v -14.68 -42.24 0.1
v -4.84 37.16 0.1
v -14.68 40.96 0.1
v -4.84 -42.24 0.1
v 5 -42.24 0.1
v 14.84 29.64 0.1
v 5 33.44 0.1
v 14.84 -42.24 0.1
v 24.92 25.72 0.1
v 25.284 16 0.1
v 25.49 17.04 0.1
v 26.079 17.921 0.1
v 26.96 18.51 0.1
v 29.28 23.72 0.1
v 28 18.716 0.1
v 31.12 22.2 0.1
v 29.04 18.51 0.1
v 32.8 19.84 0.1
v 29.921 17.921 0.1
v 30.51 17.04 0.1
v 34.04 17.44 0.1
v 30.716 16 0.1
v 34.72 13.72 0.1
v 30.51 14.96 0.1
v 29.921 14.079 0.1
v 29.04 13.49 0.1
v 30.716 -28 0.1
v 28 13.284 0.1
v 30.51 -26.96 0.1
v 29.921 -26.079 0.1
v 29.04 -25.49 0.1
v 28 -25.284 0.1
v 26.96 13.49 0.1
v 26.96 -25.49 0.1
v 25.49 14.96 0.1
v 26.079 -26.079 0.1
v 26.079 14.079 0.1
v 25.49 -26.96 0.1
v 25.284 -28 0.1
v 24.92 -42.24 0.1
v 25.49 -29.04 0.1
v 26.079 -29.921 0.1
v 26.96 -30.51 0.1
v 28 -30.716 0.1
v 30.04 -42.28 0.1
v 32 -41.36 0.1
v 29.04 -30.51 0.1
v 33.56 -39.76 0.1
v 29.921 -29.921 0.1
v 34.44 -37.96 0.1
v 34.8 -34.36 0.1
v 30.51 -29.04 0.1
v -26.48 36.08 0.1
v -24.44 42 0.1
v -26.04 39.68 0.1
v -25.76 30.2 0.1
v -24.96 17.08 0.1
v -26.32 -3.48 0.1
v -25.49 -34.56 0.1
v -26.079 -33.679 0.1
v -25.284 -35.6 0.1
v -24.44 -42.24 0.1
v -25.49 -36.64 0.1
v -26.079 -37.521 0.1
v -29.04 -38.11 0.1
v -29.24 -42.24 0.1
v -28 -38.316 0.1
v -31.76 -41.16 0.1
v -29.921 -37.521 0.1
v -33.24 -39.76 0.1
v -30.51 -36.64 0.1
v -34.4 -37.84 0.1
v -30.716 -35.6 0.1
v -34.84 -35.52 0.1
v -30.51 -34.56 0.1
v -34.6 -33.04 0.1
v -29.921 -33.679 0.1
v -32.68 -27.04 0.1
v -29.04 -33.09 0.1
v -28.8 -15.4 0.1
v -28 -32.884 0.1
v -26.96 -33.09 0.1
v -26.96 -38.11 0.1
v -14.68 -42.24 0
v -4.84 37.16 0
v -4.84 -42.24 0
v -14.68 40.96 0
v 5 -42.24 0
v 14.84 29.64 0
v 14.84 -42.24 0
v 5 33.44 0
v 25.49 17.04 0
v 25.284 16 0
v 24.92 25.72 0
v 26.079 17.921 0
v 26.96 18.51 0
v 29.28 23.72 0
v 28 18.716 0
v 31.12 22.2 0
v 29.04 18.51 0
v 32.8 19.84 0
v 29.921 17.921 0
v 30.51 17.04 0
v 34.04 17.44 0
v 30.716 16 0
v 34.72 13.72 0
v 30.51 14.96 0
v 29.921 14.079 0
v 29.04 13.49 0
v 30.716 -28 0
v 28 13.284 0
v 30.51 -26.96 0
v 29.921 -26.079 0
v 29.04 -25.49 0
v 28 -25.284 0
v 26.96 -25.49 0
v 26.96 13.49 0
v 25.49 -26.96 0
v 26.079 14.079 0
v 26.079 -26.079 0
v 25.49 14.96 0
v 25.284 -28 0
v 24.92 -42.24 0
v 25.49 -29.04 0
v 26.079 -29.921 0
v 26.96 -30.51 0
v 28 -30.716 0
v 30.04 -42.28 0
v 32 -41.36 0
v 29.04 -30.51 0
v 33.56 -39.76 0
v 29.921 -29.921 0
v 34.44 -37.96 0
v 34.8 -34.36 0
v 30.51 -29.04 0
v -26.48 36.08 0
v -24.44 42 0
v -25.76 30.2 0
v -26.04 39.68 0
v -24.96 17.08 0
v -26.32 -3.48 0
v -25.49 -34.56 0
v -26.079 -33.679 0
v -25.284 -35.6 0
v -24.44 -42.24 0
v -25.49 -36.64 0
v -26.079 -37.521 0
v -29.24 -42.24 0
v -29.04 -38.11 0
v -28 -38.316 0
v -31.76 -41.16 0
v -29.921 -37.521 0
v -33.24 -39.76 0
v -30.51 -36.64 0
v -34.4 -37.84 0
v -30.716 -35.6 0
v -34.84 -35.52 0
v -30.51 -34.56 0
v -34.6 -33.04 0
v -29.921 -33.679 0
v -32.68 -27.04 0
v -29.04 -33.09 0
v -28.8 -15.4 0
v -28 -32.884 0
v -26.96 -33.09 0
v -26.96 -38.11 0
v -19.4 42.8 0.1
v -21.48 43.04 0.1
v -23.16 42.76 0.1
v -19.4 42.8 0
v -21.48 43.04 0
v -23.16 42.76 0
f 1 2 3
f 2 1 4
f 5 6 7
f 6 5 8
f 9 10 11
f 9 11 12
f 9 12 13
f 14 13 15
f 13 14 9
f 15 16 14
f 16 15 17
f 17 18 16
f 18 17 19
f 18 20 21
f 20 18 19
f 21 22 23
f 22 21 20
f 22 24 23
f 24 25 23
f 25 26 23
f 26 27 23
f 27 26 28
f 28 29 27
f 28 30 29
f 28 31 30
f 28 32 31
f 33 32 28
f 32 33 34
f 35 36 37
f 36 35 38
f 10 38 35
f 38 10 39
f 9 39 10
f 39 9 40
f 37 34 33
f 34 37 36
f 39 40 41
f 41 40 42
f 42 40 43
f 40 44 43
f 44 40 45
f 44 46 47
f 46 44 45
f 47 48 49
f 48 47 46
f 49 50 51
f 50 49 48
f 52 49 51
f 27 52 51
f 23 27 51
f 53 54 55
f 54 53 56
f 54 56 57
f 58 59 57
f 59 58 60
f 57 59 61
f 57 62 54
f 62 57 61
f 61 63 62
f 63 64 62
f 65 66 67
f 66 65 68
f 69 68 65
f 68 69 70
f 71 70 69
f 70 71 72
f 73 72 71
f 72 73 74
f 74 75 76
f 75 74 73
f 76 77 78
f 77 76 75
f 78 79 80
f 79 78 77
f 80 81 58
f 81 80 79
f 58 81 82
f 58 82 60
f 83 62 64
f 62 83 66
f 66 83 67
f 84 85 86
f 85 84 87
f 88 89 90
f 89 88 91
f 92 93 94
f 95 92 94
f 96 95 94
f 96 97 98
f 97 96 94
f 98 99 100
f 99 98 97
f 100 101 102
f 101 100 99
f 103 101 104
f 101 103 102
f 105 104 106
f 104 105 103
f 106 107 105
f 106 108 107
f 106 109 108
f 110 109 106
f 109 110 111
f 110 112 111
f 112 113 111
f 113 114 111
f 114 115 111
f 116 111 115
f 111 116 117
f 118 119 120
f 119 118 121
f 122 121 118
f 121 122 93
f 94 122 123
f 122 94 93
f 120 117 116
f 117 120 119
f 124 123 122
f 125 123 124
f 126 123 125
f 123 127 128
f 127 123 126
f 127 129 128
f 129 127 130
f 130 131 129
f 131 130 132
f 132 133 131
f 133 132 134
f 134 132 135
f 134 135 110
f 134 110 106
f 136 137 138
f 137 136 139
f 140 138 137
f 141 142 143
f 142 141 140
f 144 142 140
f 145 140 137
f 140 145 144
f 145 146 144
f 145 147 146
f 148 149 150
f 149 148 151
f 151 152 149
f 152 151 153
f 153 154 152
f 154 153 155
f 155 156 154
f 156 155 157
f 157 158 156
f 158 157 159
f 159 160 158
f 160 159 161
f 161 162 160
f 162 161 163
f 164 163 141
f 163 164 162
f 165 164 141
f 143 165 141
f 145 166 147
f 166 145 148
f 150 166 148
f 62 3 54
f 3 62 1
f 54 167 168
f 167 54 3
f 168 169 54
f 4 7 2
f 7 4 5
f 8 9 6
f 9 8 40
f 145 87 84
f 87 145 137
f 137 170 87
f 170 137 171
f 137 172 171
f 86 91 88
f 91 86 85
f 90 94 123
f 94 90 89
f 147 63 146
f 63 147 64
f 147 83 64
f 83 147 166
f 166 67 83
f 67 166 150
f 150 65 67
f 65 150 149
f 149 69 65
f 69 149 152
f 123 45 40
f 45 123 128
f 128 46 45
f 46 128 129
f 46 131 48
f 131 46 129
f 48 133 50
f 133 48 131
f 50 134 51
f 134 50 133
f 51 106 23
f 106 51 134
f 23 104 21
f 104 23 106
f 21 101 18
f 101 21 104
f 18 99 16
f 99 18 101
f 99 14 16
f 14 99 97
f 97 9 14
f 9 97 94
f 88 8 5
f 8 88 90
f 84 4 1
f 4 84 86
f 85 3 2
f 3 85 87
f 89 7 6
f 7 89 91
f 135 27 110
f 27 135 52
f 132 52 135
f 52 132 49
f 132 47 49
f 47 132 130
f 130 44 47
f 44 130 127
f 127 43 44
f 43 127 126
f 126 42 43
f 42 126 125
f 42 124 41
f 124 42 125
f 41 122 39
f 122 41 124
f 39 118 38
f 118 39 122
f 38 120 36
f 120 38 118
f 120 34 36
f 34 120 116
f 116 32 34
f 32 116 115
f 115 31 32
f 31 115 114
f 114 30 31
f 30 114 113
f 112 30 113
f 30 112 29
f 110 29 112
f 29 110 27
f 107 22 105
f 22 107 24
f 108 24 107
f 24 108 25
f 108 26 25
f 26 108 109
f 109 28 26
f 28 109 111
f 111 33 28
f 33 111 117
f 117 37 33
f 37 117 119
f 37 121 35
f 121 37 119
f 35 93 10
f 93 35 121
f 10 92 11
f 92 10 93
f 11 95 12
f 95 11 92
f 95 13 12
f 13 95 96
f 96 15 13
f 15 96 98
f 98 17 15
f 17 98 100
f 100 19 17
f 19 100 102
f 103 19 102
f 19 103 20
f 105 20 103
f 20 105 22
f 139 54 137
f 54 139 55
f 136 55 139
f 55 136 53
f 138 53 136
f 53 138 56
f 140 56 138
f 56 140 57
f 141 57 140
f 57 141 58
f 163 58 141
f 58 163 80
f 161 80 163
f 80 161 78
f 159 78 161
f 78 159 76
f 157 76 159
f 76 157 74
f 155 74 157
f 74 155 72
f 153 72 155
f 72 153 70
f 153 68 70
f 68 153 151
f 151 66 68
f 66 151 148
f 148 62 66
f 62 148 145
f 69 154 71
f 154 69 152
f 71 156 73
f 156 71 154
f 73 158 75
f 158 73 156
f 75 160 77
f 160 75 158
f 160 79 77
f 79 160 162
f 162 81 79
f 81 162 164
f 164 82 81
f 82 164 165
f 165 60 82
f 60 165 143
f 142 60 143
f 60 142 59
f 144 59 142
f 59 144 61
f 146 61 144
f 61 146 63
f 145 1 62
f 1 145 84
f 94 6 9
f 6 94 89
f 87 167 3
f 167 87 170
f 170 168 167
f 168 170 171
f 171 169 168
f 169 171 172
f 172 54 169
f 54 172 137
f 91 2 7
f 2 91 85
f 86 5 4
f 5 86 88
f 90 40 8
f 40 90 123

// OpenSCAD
// file: s/u768s04.scad
use <../../lib.scad>
function ldraw_lib__s__u768s04() = [
// 0 ~Sail 11 x  9 Trapezoidal Edge Stripe  2
// 0 Name: s\u768s04.dat
// 0 Author: Philippe Hurbain [Philo]
// 0 !LDRAW_ORG Subpart UPDATE 2024-01
// 0 !LICENSE Licensed under CC BY 4.0 : see CAreadme.txt
// 
// 0 BFC CERTIFY CCW
  [0,"BFC","CERTIFY"],
  [0,"BFC","CCW"],
// 
// 0 !HISTORY 2024-01-29 [OrionP] Official Update 2024-01
// 
// 
// 4 16 -61.1 0 -105.6 -36.7 0 -105.6 -36.7 -0.25 -105.6 -61.1 -0.25 -105.6
  [4,16,-61.1,0,-105.6,-36.7,0,-105.6,-36.7,-0.25,-105.6,-61.1,-0.25,-105.6],
// 4 16 62.3 0 64.3 37.1 0 74.1 37.1 -0.25 74.1 62.3 -0.25 64.3
  [4,16,62.3,0,64.3,37.1,0,74.1,37.1,-0.25,74.1,62.3,-0.25,64.3],
// 4 16 -36.7 0 102.4 -48.5 0 107 -48.5 -0.25 107 -36.7 -0.25 102.4
  [4,16,-36.7,0,102.4,-48.5,0,107,-48.5,-0.25,107,-36.7,-0.25,102.4],
// 4 16 -48.5 0 107 -53.7 0 107.6 -53.7 -0.25 107.6 -48.5 -0.25 107
  [4,16,-48.5,0,107,-53.7,0,107.6,-53.7,-0.25,107.6,-48.5,-0.25,107],
// 4 16 -53.7 0 107.6 -57.9 0 106.9 -57.9 -0.25 106.9 -53.7 -0.25 107.6
  [4,16,-53.7,0,107.6,-57.9,0,106.9,-57.9,-0.25,106.9,-53.7,-0.25,107.6],
// 4 16 -57.9 0 106.9 -61.1 0 105 -61.1 -0.25 105 -57.9 -0.25 106.9
  [4,16,-57.9,0,106.9,-61.1,0,105,-61.1,-0.25,105,-57.9,-0.25,106.9],
// 4 16 12.5 0 83.6 -12.1 0 92.9 -12.1 -0.25 92.9 12.5 -0.25 83.6
  [4,16,12.5,0,83.6,-12.1,0,92.9,-12.1,-0.25,92.9,12.5,-0.25,83.6],
// 4 16 -12.1 0 -105.6 12.5 0 -105.6 12.5 -0.25 -105.6 -12.1 -0.25 -105.6
  [4,16,-12.1,0,-105.6,12.5,0,-105.6,12.5,-0.25,-105.6,-12.1,-0.25,-105.6],
// 4 16 37.1 0 -105.6 62.3 0 -105.6 62.3 -0.25 -105.6 37.1 -0.25 -105.6
  [4,16,37.1,0,-105.6,62.3,0,-105.6,62.3,-0.25,-105.6,37.1,-0.25,-105.6],
// 5 24 -57.9 0 106.9 -57.9 -0.25 106.9 -61.1 0 105 -53.7 0 107.6
  [5,24,-57.9,0,106.9,-57.9,-0.25,106.9,-61.1,0,105,-53.7,0,107.6],
// 5 24 -48.5 0 107 -48.5 -0.25 107 -53.7 0 107.6 -36.7 0 102.4
  [5,24,-48.5,0,107,-48.5,-0.25,107,-53.7,0,107.6,-36.7,0,102.4],
// 5 24 -53.7 0 107.6 -53.7 -0.25 107.6 -57.9 0 106.9 -48.5 0 107
  [5,24,-53.7,0,107.6,-53.7,-0.25,107.6,-57.9,0,106.9,-48.5,0,107],
];
module ldraw_lib__s__u768s04(step=0, col=false, unit=2/5, alt=false, line=0.2, solid=!$preview)
    makepoly(ldraw_lib__s__u768s04(), step=step, col=col, unit=unit, alt=alt, line=line, solid=solid);
ldraw_lib__s__u768s04(line=0.2);
// file: s/u768s02.scad
use <../../lib.scad>
function ldraw_lib__s__u768s02() = [
// 0 ~Sail 11 x  9 Trapezoidal Surface Stripe  2
// 0 Name: s\u768s02.dat
// 0 Author: Philippe Hurbain [Philo]
// 0 !LDRAW_ORG Subpart UPDATE 2024-01
// 0 !LICENSE Licensed under CC BY 4.0 : see CAreadme.txt
// 
// 0 BFC CERTIFY CCW
  [0,"BFC","CERTIFY"],
  [0,"BFC","CCW"],
// 
// 0 !HISTORY 2024-01-29 [OrionP] Official Update 2024-01
// 
// 
// 4 16 -61.1 0 -105.6 -36.7 0 -105.6 -36.7 0 102.4 -61.1 0 105
  [4,16,-61.1,0,-105.6,-36.7,0,-105.6,-36.7,0,102.4,-61.1,0,105],
// 4 16 -61.1 0 105 -36.7 0 102.4 -48.5 0 107 -53.7 0 107.6
  [4,16,-61.1,0,105,-36.7,0,102.4,-48.5,0,107,-53.7,0,107.6],
// 3 16 -53.7 0 107.6 -57.9 0 106.9 -61.1 0 105
  [3,16,-53.7,0,107.6,-57.9,0,106.9,-61.1,0,105],
// 4 16 12.5 0 83.6 -12.1 0 92.9 -12.1 0 -105.6 12.5 0 -105.6
  [4,16,12.5,0,83.6,-12.1,0,92.9,-12.1,0,-105.6,12.5,0,-105.6],
// 4 16 37.1 0 -105.6 62.3 0 -105.6 62.3 0 64.3 37.1 0 74.1
  [4,16,37.1,0,-105.6,62.3,0,-105.6,62.3,0,64.3,37.1,0,74.1],
// 2 24 37.1 0 -105.6 62.3 0 -105.6
  [2,24,37.1,0,-105.6,62.3,0,-105.6],
// 2 24 -61.1 0 -105.6 -36.7 0 -105.6
  [2,24,-61.1,0,-105.6,-36.7,0,-105.6],
// 2 24 62.3 0 64.3 37.1 0 74.1
  [2,24,62.3,0,64.3,37.1,0,74.1],
// 2 24 -53.7 0 107.6 -57.9 0 106.9
  [2,24,-53.7,0,107.6,-57.9,0,106.9],
// 2 24 -57.9 0 106.9 -61.1 0 105
  [2,24,-57.9,0,106.9,-61.1,0,105],
// 2 24 12.5 0 83.6 -12.1 0 92.9
  [2,24,12.5,0,83.6,-12.1,0,92.9],
// 2 24 -48.5 0 107 -53.7 0 107.6
  [2,24,-48.5,0,107,-53.7,0,107.6],
// 2 24 -36.7 0 102.4 -48.5 0 107
  [2,24,-36.7,0,102.4,-48.5,0,107],
// 2 24 -12.1 0 -105.6 12.5 0 -105.6
  [2,24,-12.1,0,-105.6,12.5,0,-105.6],
];
module ldraw_lib__s__u768s02(step=0, col=false, unit=2/5, alt=false, line=0.2, solid=!$preview)
    makepoly(ldraw_lib__s__u768s02(), step=step, col=col, unit=unit, alt=alt, line=line, solid=solid);
ldraw_lib__s__u768s02(line=0.2);
// main file
use <../lib.scad>
use <s/u768s01.scad>
use <s/u768s02.scad>
use <s/u768s03.scad>
use <s/u768s04.scad>
function ldraw_lib__u768p01() = [
// 0 Sail 11 x  9 Trapezoidal with Stripes on White Background Pattern
// 0 Name: u768p01.dat
// 0 Author: Philippe Hurbain [Philo]
// 0 !LDRAW_ORG Part UPDATE 2024-01
// 0 !LICENSE Licensed under CC BY 4.0 : see CAreadme.txt
// 
// 0 BFC CERTIFY CCW
  [0,"BFC","CERTIFY"],
  [0,"BFC","CCW"],
// 
// 0 !CATEGORY Sheet Fabric
// 0 !KEYWORDS BrickLink sailbb24, Enchanted Island, Imperial Trading Post
// 0 !KEYWORDS King Kahuka's Throne, Lagoon Lock-Up, Rebrickable 70966pr0001
// 0 !KEYWORDS Rock Island Refuge, set 6262, set 6267, set 6273, set 6277, set 6278
// 0 !KEYWORDS set 6292
// 
// 0 !HISTORY 2024-01-29 [OrionP] Official Update 2024-01
// 
// 
// 1 15 0 -0.25 0 1 0 0 0 1 0 0 0 1 s\u768s01.dat
  [1,15,0,-0.25,0,1,0,0,0,1,0,0,0,1, ldraw_lib__s__u768s01()],
// 1 15 0 0 0 1 0 0 0 -1 0 0 0 1 s\u768s01.dat
  [1,15,0,0,0,1,0,0,0,-1,0,0,0,1, ldraw_lib__s__u768s01()],
// 1 16 0 -0.25 0 1 0 0 0 1 0 0 0 1 s\u768s02.dat
  [1,16,0,-0.25,0,1,0,0,0,1,0,0,0,1, ldraw_lib__s__u768s02()],
// 1 16 0 0 0 1 0 0 0 -1 0 0 0 1 s\u768s02.dat
  [1,16,0,0,0,1,0,0,0,-1,0,0,0,1, ldraw_lib__s__u768s02()],
// 1 15 0 0 0 1 0 0 0 1 0 0 0 1 s\u768s03.dat
  [1,15,0,0,0,1,0,0,0,1,0,0,0,1, ldraw_lib__s__u768s03()],
// 1 16 0 0 0 1 0 0 0 1 0 0 0 1 s\u768s04.dat
  [1,16,0,0,0,1,0,0,0,1,0,0,0,1, ldraw_lib__s__u768s04()],
];
module ldraw_lib__u768p01(step=0, col=false, unit=2/5, alt=false, line=0.2, solid=!$preview)
    makepoly(ldraw_lib__u768p01(), step=step, col=col, unit=unit, alt=alt, line=line, solid=solid);
ldraw_lib__u768p01(line=0.2);
